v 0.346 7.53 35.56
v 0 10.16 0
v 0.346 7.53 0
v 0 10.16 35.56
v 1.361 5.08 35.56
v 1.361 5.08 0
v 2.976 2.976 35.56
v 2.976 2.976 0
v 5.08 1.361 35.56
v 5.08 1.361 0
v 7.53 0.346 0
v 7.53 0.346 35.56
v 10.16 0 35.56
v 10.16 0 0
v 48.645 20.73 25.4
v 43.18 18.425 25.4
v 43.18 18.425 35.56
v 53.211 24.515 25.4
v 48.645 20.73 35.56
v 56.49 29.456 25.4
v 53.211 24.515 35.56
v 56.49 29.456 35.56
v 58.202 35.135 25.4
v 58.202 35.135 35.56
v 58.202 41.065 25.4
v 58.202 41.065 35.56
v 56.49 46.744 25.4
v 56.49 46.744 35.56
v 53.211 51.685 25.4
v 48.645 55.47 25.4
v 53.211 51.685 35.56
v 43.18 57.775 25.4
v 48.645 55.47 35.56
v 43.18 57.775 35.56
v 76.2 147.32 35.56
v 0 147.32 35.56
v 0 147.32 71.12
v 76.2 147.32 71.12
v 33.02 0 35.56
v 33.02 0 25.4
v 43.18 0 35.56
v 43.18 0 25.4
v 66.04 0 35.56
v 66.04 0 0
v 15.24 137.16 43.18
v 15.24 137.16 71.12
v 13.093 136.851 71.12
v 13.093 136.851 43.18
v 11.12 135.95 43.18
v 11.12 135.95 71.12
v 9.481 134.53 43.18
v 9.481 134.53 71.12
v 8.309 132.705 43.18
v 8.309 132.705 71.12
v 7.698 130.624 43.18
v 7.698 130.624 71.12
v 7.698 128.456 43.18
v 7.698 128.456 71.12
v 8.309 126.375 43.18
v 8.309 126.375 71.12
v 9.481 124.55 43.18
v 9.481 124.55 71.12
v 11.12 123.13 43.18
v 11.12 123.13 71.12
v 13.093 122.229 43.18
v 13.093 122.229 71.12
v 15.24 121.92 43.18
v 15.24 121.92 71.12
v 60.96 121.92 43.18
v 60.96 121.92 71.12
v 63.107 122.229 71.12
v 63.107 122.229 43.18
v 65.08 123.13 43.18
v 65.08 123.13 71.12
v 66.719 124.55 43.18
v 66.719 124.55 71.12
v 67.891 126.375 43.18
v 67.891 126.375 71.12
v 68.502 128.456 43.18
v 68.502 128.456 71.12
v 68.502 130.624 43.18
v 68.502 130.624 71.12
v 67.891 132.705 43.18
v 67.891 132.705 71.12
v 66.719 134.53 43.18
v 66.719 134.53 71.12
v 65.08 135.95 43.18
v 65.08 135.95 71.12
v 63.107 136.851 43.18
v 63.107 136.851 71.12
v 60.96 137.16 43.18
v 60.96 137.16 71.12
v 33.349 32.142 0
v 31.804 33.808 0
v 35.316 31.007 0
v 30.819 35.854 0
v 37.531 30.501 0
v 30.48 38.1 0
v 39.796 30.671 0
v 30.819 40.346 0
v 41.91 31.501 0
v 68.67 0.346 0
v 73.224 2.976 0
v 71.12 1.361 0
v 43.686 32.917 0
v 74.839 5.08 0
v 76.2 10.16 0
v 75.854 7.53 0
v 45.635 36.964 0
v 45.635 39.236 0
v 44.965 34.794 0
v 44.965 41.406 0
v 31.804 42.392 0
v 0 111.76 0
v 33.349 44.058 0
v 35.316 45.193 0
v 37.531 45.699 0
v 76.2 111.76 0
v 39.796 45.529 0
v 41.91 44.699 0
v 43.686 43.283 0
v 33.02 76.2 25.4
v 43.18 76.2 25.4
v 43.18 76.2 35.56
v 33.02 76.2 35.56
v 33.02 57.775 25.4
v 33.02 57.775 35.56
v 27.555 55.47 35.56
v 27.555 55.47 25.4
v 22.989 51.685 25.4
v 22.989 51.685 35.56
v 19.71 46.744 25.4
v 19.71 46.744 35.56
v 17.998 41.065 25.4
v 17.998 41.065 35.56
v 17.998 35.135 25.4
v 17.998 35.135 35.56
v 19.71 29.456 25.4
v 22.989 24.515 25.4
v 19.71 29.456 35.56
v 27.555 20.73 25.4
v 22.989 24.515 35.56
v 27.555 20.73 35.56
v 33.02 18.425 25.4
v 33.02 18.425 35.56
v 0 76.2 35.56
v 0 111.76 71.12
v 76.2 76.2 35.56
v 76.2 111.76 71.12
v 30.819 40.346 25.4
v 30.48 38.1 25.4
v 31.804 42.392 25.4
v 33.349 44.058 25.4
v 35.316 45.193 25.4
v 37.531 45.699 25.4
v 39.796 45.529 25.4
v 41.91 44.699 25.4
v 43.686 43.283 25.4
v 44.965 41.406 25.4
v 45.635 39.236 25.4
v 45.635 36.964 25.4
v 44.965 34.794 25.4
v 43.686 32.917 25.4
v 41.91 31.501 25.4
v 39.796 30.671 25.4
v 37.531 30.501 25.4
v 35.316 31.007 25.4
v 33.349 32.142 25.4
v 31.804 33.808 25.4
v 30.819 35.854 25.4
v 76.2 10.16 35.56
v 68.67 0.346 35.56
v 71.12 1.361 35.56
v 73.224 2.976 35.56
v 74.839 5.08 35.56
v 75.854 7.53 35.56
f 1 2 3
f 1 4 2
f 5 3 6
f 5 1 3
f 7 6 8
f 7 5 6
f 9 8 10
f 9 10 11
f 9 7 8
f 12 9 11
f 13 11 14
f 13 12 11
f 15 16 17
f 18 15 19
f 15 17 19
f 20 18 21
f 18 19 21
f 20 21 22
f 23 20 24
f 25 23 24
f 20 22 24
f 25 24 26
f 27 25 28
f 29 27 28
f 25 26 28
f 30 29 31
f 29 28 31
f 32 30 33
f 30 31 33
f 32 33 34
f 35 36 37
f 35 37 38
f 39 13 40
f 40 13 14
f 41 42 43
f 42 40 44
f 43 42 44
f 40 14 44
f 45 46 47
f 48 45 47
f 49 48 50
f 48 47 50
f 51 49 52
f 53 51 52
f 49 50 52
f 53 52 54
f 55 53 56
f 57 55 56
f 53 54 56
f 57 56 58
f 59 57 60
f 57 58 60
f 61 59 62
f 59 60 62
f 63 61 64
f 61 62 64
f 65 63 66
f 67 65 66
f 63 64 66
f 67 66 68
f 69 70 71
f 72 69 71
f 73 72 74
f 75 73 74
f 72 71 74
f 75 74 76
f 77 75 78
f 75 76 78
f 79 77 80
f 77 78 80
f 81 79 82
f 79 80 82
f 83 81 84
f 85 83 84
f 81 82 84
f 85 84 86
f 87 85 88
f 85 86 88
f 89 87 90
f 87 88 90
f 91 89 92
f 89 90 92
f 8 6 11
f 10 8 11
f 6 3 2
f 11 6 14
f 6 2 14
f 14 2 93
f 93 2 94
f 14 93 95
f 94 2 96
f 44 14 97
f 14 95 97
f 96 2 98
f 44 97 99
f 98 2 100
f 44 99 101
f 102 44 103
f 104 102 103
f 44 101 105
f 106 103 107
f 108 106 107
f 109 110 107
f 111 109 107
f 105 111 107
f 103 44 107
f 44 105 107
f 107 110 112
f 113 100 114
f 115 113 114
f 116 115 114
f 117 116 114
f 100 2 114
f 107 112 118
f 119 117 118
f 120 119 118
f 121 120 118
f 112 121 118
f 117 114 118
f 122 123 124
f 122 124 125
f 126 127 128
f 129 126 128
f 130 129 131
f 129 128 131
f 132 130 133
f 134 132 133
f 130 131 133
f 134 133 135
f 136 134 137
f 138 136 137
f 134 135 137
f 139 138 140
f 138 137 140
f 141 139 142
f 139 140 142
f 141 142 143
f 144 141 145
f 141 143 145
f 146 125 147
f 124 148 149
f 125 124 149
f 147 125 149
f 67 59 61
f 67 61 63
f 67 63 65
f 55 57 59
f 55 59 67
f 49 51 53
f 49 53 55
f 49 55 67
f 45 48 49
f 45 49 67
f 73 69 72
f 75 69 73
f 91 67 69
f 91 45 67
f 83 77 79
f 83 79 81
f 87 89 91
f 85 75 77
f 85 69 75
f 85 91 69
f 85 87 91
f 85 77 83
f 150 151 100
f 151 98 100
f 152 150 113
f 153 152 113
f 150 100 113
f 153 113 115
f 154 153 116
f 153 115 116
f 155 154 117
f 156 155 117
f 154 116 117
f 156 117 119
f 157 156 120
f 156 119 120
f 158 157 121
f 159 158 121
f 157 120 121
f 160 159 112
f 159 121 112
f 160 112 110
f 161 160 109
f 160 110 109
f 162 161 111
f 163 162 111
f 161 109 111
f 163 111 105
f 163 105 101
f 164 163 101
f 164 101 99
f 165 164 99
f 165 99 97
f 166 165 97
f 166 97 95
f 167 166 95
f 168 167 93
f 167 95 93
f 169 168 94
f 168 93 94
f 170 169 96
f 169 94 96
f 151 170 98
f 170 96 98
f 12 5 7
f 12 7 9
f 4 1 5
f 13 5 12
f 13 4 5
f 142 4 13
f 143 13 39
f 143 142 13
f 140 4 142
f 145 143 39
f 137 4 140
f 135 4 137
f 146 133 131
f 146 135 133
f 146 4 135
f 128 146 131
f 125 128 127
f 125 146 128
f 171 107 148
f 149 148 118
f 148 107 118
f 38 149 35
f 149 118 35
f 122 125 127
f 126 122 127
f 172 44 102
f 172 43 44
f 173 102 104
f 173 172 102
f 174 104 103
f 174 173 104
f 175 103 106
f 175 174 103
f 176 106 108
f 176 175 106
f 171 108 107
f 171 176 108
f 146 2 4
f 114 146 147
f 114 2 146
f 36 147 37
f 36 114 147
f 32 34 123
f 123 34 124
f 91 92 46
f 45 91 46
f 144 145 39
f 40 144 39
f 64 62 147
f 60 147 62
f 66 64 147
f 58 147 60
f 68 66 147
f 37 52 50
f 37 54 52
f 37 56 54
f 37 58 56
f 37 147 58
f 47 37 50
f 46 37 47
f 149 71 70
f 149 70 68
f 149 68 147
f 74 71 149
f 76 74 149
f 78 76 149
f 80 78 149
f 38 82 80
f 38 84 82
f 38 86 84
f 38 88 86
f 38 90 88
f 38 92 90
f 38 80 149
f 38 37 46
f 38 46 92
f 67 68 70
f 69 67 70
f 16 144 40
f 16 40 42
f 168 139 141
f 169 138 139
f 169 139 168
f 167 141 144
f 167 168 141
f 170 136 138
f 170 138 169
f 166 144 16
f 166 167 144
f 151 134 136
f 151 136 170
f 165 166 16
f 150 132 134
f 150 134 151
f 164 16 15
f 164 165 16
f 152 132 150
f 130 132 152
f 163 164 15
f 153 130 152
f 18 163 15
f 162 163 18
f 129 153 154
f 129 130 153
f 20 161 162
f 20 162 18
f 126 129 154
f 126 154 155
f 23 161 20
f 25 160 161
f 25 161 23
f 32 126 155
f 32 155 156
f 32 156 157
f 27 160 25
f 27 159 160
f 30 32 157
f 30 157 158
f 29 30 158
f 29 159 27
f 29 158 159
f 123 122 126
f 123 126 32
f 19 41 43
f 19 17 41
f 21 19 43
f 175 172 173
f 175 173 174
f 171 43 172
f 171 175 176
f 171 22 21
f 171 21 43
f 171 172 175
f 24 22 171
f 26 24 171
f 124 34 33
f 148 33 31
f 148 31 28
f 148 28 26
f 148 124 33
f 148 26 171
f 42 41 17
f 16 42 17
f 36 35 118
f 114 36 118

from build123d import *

# Parameters (mm, degrees)
F0_W           = 76.2
F0_H           = 35.56
F1_DEPTH       = 71.12
F0_H_2         = 76.2
F2_DEPTH       = 35.56
F4_DEPTH       = 76.2
F6_D           = 15.24
F6_CBORE_D     = 40.64
F6_CBORE_DEPTH = 10.16
F8_DEPTH       = 27.94
F10_DEPTH      = 10.16
F11_R          = 10.16


with BuildPart() as f1:
    # F0 (on Top) → F1 (new body)
    with BuildSketch(Plane.XY):
        with Locations((38.1, 129.54)):
            Rectangle(F0_W, F0_H)
        with Locations((38.1, 93.98)):
            Rectangle(F0_W, F0_H)
    extrude(amount=F1_DEPTH)

    # F0 (on Top) → F2 (join)
    with BuildSketch(Plane.XY):
        with Locations((38.1, 38.1)):
            Rectangle(F0_W, F0_H_2)
    extrude(amount=F2_DEPTH)

    # F3 (on face) → F4 (cut)
    with BuildSketch(Plane.YZ.offset(76.2)):
        Polygon((76.2, 71.12), (76.2, 35.56), (111.76, 71.12), align=None)
        Polygon((147.32, 0), (147.32, 35.56), (111.76, 0), align=None)
    extrude(amount=-F4_DEPTH, mode=Mode.SUBTRACT)

    # F6 (through all)
    with Locations(Plane.XY.offset(35.56)):
        with Locations((38.1, 38.1)):
            CounterBoreHole(F6_D / 2, F6_CBORE_D / 2, F6_CBORE_DEPTH)

    # F7 (on face) → F8 (cut)
    with BuildSketch(Plane.XY.offset(71.12)):
        with BuildLine():
            Line((60.96, 137.16), (15.24, 137.16))
            ThreePointArc((15.24, 137.16), (7.62, 129.54), (15.24, 121.92))
            Line((15.24, 121.92), (60.96, 121.92))
            ThreePointArc((60.96, 121.92), (68.58, 129.54), (60.96, 137.16))
        make_face()
    extrude(amount=-F8_DEPTH, mode=Mode.SUBTRACT)

    # F9 (on face) → F10 (cut)
    with BuildSketch(Plane.XY.offset(35.56)):
        with BuildLine():
            Line((43.18, 76.2), (33.02, 76.2))
            Line((33.02, 76.2), (33.02, 57.7747553987))
            ThreePointArc((33.02, 57.7747553987), (38.1, 58.42), (43.18, 57.7747553987))
            Line((43.18, 57.7747553987), (43.18, 76.2))
        make_face()
        with BuildLine():
            ThreePointArc((43.18, 18.4252446013), (38.1, 17.78), (33.02, 18.4252446013))
            Line((33.02, 18.4252446013), (33.02, 0))
            Line((33.02, 0), (43.18, 0))
            Line((43.18, 0), (43.18, 18.4252446013))
        make_face()
    extrude(amount=-F10_DEPTH, mode=Mode.SUBTRACT)

    # F11
    f11_edges = [f1.edges().sort_by_distance(p)[0] for p in [
        (76.2, 0, 17.78),
        (0, 0, 17.78),
    ]]
    fillet(f11_edges, radius=F11_R)


solid = f1.part
